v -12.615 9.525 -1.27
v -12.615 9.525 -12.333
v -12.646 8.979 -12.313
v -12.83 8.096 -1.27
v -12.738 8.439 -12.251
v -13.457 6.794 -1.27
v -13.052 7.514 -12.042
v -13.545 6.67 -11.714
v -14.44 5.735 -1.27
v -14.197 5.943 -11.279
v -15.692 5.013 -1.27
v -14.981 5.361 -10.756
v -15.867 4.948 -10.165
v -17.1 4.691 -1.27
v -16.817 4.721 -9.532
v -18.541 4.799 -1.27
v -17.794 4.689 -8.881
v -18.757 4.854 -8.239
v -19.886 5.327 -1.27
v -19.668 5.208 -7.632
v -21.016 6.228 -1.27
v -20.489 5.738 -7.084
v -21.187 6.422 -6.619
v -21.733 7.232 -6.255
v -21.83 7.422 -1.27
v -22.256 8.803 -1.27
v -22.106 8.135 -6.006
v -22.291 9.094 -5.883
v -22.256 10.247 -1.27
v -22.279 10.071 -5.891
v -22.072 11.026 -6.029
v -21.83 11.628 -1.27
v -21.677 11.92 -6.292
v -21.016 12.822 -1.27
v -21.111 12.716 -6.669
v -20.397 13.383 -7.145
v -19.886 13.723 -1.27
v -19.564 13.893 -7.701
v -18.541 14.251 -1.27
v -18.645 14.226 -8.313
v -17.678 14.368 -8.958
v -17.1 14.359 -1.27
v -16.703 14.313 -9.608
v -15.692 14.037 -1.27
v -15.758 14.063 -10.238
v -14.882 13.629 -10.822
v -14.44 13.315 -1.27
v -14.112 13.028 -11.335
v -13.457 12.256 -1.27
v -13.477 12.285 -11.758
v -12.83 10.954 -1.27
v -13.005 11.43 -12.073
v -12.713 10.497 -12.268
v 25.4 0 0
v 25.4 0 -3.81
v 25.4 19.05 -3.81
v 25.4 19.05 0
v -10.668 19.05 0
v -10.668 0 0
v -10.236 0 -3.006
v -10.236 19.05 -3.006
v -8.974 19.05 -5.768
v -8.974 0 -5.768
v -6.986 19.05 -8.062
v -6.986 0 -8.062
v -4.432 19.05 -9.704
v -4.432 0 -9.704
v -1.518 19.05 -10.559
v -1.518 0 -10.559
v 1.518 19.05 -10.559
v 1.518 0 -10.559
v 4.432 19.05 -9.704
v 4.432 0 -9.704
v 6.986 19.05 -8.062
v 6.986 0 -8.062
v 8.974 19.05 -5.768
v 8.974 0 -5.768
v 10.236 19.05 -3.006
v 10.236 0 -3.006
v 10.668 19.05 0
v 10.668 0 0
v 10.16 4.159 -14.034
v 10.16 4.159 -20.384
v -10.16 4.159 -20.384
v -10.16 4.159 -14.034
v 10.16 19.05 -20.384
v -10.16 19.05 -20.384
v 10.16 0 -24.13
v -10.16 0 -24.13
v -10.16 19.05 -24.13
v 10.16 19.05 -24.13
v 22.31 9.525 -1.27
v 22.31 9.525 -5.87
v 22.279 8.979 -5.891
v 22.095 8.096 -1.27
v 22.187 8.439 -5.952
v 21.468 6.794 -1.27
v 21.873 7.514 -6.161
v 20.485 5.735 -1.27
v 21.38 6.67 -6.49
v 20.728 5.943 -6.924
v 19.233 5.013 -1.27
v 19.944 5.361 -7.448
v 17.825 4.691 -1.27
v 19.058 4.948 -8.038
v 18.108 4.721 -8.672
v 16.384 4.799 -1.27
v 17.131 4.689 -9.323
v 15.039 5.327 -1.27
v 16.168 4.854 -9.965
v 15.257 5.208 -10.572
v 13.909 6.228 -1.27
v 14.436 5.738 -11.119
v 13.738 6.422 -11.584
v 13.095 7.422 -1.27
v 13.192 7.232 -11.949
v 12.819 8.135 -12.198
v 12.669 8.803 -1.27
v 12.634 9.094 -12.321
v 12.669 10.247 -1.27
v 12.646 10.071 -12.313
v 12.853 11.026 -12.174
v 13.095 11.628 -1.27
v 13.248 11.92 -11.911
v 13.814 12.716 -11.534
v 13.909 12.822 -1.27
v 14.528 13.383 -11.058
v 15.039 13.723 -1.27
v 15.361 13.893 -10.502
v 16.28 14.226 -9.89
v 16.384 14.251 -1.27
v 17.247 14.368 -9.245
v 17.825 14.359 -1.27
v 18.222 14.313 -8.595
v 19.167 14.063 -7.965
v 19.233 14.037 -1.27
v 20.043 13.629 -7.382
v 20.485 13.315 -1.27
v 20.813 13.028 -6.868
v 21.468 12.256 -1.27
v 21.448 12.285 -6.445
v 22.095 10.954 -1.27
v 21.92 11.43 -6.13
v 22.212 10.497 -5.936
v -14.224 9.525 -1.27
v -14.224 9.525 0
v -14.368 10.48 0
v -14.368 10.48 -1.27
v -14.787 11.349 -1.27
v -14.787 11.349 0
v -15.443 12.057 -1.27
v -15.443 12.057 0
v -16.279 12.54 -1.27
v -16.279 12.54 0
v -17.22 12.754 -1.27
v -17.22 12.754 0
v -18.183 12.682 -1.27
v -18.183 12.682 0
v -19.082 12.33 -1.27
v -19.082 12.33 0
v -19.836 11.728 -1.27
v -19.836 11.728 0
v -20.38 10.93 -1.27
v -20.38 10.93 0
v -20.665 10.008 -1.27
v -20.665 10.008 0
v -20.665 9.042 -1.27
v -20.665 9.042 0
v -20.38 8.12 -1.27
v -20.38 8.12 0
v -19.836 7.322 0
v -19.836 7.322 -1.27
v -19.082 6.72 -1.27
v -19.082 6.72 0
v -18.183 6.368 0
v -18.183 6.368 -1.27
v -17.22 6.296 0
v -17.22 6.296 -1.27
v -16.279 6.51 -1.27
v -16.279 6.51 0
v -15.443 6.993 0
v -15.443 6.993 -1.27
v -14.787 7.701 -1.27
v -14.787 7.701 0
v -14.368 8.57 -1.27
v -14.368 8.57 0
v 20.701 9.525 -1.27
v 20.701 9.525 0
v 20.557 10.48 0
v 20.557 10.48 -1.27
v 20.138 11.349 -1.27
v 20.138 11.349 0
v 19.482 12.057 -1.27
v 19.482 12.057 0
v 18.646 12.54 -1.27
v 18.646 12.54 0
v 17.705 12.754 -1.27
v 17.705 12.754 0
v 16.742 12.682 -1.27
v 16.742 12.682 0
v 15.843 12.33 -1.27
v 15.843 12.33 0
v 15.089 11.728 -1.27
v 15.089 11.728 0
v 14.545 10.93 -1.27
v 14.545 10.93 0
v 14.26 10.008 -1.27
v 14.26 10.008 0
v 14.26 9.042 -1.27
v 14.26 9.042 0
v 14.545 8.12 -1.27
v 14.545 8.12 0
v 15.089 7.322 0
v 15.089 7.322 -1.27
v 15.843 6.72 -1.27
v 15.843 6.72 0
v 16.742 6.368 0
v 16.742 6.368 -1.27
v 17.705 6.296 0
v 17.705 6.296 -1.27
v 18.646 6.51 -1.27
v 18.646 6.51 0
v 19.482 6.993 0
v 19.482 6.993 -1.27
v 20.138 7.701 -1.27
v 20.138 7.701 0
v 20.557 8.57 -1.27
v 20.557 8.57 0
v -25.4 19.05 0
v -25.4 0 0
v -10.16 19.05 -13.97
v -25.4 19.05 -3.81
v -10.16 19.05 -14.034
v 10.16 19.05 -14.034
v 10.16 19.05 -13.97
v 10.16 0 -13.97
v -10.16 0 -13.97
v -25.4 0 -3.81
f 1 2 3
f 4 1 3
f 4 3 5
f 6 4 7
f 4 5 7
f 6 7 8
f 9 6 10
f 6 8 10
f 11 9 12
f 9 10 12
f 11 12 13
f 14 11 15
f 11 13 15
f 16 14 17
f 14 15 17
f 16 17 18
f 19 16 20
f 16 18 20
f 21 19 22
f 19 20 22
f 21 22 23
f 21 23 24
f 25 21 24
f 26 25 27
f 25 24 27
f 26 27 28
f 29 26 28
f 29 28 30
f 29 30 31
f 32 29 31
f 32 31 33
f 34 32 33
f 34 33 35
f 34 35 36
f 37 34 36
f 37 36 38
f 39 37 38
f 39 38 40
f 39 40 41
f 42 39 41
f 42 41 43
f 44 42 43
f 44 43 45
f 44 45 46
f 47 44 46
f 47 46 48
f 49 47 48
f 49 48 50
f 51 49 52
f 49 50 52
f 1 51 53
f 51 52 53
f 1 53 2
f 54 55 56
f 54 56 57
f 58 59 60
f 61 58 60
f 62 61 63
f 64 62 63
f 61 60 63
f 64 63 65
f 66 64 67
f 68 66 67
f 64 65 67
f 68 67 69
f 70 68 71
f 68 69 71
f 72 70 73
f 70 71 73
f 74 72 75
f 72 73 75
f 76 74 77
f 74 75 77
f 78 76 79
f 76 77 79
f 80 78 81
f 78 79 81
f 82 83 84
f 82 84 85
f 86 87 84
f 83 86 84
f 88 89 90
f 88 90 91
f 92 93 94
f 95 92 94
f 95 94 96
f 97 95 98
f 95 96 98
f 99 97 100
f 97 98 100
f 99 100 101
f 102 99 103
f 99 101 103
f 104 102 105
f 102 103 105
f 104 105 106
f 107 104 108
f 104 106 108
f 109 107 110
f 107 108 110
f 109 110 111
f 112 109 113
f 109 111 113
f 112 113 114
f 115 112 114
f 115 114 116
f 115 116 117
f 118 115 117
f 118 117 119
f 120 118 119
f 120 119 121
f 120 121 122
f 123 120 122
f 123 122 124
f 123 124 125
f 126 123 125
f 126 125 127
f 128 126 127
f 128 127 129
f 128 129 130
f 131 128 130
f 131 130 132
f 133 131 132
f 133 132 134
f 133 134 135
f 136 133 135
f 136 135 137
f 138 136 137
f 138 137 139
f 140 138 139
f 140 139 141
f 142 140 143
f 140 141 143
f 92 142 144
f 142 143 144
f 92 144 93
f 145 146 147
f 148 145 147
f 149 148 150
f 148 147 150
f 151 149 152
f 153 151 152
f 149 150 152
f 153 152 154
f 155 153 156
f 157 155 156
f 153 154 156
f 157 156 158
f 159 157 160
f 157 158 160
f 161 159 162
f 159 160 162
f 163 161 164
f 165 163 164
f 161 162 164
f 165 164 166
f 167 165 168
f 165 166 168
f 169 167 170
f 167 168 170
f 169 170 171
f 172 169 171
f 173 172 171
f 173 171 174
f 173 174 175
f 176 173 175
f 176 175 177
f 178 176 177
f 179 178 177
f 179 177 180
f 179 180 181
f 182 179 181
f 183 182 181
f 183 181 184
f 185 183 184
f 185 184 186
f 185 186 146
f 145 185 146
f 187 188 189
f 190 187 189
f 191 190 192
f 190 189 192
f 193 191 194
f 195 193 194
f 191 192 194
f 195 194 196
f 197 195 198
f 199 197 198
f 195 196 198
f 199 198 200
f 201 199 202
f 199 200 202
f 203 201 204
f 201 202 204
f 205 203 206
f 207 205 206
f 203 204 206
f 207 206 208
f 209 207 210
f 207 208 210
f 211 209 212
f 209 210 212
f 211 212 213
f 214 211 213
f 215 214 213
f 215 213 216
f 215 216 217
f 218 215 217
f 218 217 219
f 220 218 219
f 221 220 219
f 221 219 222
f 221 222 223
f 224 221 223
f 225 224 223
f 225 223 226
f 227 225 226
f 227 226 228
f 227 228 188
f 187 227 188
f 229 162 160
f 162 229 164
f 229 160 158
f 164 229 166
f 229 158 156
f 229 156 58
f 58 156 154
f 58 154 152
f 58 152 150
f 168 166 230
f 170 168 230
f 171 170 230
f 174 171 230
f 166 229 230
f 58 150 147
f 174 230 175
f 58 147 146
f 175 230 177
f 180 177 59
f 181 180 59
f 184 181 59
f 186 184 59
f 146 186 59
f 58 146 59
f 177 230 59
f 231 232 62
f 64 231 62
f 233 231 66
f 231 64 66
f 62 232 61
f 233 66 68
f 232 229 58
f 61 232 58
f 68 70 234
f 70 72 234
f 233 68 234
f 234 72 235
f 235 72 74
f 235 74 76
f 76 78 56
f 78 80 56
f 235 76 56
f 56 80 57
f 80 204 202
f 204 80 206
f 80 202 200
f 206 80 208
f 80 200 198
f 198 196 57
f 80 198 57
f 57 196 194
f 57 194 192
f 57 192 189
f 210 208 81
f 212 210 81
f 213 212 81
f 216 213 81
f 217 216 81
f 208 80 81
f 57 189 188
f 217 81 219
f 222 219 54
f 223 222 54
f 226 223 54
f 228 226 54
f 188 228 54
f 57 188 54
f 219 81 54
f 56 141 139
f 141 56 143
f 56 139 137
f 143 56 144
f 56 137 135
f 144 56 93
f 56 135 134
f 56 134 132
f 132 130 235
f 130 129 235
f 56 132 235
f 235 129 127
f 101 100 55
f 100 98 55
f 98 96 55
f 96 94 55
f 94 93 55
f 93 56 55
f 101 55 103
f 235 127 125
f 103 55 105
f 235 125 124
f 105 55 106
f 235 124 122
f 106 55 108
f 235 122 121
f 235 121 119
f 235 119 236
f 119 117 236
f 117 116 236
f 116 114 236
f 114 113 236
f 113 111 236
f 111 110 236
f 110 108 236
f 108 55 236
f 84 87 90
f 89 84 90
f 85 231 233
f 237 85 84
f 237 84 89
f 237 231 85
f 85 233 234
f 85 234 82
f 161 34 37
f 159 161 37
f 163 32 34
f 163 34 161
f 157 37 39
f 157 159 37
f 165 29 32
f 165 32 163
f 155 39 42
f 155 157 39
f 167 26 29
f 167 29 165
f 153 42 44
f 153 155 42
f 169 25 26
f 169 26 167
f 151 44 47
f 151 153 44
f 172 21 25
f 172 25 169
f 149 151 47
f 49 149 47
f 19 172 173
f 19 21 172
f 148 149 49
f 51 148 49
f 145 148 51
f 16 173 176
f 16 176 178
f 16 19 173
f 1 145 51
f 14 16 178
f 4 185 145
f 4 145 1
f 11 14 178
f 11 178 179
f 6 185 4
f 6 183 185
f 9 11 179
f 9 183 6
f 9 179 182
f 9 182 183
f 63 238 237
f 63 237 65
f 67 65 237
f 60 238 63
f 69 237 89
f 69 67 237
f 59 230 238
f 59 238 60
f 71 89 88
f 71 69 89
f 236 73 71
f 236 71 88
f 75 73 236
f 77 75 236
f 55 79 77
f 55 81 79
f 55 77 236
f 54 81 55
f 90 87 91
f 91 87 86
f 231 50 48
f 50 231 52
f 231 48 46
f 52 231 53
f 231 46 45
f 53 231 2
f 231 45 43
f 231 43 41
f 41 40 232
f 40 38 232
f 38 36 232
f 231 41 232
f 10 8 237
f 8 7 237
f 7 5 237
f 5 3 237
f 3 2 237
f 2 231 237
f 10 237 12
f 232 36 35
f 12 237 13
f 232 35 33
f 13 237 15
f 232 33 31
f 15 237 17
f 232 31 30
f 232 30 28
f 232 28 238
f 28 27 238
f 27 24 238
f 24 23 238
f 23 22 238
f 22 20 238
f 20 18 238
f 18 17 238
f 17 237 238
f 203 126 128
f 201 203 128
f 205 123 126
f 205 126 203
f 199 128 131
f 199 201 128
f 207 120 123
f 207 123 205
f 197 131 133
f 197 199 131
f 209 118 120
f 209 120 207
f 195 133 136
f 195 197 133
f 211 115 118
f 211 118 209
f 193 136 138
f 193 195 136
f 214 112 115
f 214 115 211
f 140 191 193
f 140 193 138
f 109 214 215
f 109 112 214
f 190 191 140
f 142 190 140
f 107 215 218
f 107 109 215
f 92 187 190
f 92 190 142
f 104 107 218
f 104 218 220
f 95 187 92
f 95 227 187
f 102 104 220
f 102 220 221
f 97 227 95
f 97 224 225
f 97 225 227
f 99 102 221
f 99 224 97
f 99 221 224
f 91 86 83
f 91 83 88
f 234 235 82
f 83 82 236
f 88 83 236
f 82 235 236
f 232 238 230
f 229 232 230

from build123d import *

# Parameters (mm, degrees)
F0_W      = 50.8
F0_H      = 13.97
F1_DEPTH  = 19.05
F3_DEPTH  = 19.05
F5_DEPTH  = 25.4
F6_R      = 3.2385
F7_DEPTH  = 25.4
F8_R      = 4.8475114841
F9_DEPTH  = 12.7
F10_W     = 20.32
F10_H     = 19.05
F11_DEPTH = 10.16
F12_W     = 14.8905639175
F12_H     = 6.35
F13_DEPTH = 25.4


with BuildPart() as f1:
    # F0 (on Front) → F1 (new body)
    with BuildSketch(Plane.XZ):
        with Locations((0, -6.985)):
            Rectangle(F0_W, F0_H)
    extrude(amount=-F1_DEPTH)

    # F2 (on face) → F3 (cut)
    with BuildSketch(Plane.XZ):
        with BuildLine():
            ThreePointArc((-10.668, 0), (0, -10.668), (10.668, 0))
            Line((10.668, 0), (-10.668, 0))
        make_face()
    extrude(amount=-F3_DEPTH, mode=Mode.SUBTRACT)

    # F4 (on face) → F5 (cut)
    with BuildSketch(Plane.XZ):
        Polygon((-25.4, -3.81), (-25.4, -13.97), (-10.16, -13.97), align=None)
        Polygon((25.4, -13.97), (25.4, -3.81), (10.16, -13.97), align=None)
    extrude(amount=-F5_DEPTH, mode=Mode.SUBTRACT)

    # F6 (on face) → F7 (cut)
    with BuildSketch(Plane.XY):
        with Locations((-17.4625, 9.525)):
            Circle(F6_R)
        with Locations((17.4625, 9.525)):
            Circle(F6_R)
    extrude(amount=-F7_DEPTH, mode=Mode.SUBTRACT)

    # F8 (on face) → F9 (cut)
    with BuildSketch(Plane(origin=(0, 0, -13.97), x_dir=(1, 0, 0), z_dir=(0, 0, -1))):
        with Locations((-17.4625, -9.525)):
            Circle(F8_R)
        with Locations((17.4625, -9.525)):
            Circle(F8_R)
    extrude(amount=-F9_DEPTH, mode=Mode.SUBTRACT)

    # F10 (on face) → F11 (join)
    with BuildSketch(Plane(origin=(0, 0, -13.97), x_dir=(1, 0, 0), z_dir=(0, 0, -1))):
        with Locations((0, -9.525)):
            Rectangle(F10_W, F10_H)
    extrude(amount=F11_DEPTH)

    # F12 (on face) → F13 (cut)
    with BuildSketch(Plane(origin=(-10.16, 0, 0), x_dir=(0, -1, 0), z_dir=(-1, 0, 0))):
        with Locations((-11.6047180412, -17.2086453915)):
            Rectangle(F12_W, F12_H)
    extrude(amount=-F13_DEPTH, mode=Mode.SUBTRACT)


solid = f1.part
